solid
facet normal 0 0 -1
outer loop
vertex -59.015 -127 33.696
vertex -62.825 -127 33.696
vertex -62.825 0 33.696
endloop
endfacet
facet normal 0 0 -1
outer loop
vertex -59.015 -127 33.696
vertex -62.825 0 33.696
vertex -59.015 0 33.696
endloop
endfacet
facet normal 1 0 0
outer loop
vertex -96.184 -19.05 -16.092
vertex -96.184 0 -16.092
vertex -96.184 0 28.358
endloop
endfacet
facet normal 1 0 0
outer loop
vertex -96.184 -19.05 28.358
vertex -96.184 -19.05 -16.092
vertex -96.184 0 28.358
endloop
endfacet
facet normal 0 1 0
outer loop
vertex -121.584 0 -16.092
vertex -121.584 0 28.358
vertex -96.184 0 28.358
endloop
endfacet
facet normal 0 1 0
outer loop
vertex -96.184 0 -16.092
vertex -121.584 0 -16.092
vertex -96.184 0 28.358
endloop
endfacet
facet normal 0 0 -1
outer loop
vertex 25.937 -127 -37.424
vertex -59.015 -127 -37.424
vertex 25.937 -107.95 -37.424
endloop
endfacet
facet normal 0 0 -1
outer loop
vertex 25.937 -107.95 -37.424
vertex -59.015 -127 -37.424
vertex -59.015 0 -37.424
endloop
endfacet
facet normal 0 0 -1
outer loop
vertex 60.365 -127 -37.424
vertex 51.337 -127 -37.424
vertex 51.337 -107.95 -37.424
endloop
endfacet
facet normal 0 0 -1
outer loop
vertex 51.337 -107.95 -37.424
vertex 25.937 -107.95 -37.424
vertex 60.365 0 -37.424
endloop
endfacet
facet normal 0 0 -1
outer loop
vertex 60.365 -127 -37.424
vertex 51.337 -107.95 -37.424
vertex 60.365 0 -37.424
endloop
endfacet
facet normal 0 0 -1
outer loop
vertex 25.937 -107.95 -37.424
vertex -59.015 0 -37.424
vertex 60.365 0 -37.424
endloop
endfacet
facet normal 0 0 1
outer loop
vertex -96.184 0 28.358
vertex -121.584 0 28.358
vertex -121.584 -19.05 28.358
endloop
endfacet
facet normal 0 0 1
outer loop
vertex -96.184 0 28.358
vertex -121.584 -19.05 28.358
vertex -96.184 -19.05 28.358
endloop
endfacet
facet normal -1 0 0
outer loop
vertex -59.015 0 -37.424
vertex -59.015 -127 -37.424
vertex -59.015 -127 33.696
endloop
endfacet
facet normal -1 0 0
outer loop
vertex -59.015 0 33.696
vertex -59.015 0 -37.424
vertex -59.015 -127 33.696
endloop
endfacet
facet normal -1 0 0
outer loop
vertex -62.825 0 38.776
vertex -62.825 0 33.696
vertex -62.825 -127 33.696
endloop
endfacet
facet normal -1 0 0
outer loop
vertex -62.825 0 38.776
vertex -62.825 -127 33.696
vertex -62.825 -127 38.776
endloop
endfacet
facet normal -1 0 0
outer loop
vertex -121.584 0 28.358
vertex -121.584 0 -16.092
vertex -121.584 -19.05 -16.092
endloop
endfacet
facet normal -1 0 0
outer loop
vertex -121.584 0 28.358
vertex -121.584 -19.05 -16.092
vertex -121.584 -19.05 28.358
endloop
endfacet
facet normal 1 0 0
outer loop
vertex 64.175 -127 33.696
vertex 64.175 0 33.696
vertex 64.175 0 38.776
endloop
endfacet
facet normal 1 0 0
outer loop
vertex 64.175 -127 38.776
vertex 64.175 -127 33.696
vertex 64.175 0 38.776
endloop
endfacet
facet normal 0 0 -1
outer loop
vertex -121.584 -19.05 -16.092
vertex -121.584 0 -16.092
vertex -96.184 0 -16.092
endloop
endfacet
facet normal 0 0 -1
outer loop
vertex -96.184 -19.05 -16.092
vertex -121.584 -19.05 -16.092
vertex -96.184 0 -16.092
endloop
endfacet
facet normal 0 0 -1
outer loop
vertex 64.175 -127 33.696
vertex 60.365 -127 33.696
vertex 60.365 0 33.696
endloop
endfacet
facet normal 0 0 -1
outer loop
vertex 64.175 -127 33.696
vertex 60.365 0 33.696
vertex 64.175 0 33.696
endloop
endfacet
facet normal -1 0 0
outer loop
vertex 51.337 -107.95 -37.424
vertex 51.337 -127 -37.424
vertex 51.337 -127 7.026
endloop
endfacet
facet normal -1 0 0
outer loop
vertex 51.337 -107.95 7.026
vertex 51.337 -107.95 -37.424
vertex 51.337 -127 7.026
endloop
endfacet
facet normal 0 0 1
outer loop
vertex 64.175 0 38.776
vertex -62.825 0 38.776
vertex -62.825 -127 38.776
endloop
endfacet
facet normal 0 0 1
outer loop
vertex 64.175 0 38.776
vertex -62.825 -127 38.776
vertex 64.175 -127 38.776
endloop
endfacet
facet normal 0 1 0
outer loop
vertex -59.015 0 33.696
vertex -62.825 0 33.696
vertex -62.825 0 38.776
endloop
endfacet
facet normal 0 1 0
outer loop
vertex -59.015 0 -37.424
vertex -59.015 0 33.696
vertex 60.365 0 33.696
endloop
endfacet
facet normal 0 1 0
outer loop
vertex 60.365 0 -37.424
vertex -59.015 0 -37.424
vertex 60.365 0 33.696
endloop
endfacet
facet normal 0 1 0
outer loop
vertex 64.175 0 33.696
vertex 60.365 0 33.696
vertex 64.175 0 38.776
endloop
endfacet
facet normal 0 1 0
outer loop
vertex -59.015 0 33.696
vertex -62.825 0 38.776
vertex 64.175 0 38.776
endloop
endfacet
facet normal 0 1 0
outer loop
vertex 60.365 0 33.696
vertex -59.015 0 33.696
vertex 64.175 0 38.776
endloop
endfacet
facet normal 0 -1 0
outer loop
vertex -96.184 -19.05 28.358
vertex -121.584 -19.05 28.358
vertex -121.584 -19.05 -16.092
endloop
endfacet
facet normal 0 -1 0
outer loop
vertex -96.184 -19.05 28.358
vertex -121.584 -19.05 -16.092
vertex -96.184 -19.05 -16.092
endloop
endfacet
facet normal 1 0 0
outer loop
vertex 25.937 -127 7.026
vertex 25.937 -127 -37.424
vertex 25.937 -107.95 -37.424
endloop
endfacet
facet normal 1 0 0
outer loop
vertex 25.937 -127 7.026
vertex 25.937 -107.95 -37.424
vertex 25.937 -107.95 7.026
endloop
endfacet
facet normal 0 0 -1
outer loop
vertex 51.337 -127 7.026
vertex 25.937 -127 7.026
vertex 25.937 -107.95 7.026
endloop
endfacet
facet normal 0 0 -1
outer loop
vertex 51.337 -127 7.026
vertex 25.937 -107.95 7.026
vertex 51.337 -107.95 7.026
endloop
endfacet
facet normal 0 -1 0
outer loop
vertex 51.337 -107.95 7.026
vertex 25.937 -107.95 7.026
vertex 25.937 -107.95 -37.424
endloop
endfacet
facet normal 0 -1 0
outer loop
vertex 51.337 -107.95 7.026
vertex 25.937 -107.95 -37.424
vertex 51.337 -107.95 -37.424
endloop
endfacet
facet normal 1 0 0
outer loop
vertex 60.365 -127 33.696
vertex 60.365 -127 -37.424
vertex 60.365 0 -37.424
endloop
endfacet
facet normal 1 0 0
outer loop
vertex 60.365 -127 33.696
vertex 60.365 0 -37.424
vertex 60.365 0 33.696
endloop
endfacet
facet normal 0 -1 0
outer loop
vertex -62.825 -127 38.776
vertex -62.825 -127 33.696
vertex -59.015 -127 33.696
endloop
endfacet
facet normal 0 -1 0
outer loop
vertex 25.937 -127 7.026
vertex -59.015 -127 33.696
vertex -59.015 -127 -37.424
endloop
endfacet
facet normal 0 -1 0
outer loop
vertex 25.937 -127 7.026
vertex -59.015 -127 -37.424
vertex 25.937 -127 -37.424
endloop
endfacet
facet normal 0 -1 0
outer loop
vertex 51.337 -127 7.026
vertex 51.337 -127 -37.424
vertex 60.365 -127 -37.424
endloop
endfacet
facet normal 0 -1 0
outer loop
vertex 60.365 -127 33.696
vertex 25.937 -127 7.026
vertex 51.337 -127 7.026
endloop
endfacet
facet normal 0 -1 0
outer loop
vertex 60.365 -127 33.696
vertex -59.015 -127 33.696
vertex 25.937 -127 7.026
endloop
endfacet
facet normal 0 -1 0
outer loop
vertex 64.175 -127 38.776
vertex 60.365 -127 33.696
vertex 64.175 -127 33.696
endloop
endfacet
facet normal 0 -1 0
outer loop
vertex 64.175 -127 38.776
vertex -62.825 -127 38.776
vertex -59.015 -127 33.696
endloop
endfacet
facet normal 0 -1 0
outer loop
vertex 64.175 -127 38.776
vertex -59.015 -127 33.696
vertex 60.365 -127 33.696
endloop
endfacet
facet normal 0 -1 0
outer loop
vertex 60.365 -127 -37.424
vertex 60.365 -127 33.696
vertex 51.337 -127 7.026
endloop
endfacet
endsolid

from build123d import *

# Parameters (mm, degrees)
F0_W     = 127
F0_H     = 76.2
F1_DEPTH = 127
F2_W     = 25.4
F2_H     = 44.45
F3_DEPTH = 19.05
F4_W     = 25.4
F4_H     = 44.45
F5_DEPTH = 19.05
F6_W     = 3.81
F6_H     = 71.12
F7_DEPTH = 127
F8_W     = 3.81
F8_H     = 71.12
F9_DEPTH = 127


with BuildPart() as f1:
    # F0 (on Front) → F1 (new body)
    with BuildSketch(Plane.XZ):
        with Locations((0.67462, 0.675859)):
            Rectangle(F0_W, F0_H)
    extrude(amount=F1_DEPTH)

    # F2 (on face) → F3 (cut)
    with BuildSketch(Plane.XZ.offset(127)):
        with Locations((38.636803, -15.199141)):
            Rectangle(F2_W, F2_H)
    extrude(amount=-F3_DEPTH, mode=Mode.SUBTRACT)

    # F6 (on face) → F7 (cut)
    with BuildSketch(Plane.XZ.offset(127)):
        with Locations((-60.92038, -1.864141)):
            Rectangle(F6_W, F6_H)
    extrude(amount=-F7_DEPTH, mode=Mode.SUBTRACT)

    # F8 (on face) → F9 (cut)
    with BuildSketch(Plane.XZ.offset(127)):
        with Locations((62.26962, -1.864141)):
            Rectangle(F8_W, F8_H)
    extrude(amount=-F9_DEPTH, mode=Mode.SUBTRACT)


with BuildPart() as f5:
    # F4 (on Front) → F5 (new body)
    with BuildSketch(Plane.XZ):
        with Locations((-108.883761, 6.133098)):
            Rectangle(F4_W, F4_H)
    extrude(amount=F5_DEPTH)


solid = Compound([f1.part, f5.part])
